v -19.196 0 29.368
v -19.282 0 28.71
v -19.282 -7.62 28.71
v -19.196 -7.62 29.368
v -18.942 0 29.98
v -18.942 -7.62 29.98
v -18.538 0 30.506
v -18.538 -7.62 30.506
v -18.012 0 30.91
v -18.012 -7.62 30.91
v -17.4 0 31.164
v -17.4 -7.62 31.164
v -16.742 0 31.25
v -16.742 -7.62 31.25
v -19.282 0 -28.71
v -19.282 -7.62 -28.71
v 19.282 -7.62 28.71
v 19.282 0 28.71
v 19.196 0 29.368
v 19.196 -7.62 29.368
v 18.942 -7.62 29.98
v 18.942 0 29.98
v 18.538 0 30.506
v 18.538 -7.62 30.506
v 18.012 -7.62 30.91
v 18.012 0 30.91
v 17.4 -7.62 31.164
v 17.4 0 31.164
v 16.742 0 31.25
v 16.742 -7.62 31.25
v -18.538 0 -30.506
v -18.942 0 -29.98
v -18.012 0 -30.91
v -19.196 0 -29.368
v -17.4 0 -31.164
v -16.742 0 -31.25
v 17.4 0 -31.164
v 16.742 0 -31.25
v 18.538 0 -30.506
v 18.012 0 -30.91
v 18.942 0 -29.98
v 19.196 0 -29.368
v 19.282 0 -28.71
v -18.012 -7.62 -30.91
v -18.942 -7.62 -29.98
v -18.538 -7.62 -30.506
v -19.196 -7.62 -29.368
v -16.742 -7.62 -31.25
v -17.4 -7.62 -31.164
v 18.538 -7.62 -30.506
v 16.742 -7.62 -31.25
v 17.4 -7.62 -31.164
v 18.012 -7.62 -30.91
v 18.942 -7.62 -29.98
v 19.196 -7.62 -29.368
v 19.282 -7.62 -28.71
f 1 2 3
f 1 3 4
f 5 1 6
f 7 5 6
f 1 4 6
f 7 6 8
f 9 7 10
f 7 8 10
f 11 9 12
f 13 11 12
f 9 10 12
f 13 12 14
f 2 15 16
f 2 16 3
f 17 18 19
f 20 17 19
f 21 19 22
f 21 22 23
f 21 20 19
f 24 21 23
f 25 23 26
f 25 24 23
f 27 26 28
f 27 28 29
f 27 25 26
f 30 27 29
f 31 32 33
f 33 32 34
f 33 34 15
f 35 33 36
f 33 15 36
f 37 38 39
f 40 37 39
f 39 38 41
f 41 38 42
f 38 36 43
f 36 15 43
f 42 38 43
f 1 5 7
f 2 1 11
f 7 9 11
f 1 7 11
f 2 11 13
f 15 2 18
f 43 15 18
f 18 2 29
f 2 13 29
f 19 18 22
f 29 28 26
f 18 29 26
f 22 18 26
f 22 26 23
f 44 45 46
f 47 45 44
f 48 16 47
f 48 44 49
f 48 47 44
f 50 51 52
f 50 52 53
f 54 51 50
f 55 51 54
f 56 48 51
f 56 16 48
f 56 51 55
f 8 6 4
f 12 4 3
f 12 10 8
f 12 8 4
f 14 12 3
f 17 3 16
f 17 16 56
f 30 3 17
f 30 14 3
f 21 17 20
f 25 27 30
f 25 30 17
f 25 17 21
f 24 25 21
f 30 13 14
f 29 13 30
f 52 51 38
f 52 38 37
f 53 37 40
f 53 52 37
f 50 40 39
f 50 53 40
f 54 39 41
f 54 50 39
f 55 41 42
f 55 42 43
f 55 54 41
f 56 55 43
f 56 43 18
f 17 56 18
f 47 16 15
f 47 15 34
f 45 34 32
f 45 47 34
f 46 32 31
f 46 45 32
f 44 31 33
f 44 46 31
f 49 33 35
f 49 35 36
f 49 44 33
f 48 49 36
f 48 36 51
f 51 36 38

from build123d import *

# Parameters (mm, degrees)
F0_W     = 38.56438
F0_H     = 62.500886
F1_DEPTH = 7.62
F2_R     = 2.54
F3_W     = 33.48438
F3_H     = 20.629584
F4_DEPTH = 1.27


with BuildPart() as f1:
    # F0 (on Front) → F1 (new body)
    with BuildSketch(Plane.XZ):
        Rectangle(F0_W, F0_H)
    extrude(amount=F1_DEPTH)

    # F2
    f2_edges = [f1.edges().sort_by_distance(p)[0] for p in [
        (19.28219, -3.81, 31.250443),
        (-19.28219, -3.81, 31.250443),
        (19.28219, -3.81, -31.250443),
        (-19.28219, -3.81, -31.250443),
    ]]
    fillet(f2_edges, radius=F2_R)

    # F3 (on face) → F4 (join)
    with BuildSketch(Plane.XZ.offset(7.62)):
        with Locations((0, 18.395651)):
            Rectangle(F3_W, F3_H)
        with BuildLine():
            ThreePointArc((-19.28219, -28.710443), (-18.538241, -30.506495), (-16.74219, -31.250443))
            Line((-16.74219, -31.250443), (16.74219, -31.250443))
            ThreePointArc((16.74219, -31.250443), (18.538241, -30.506495), (19.28219, -28.710443))
            Line((19.28219, -28.710443), (19.28219, 28.710443))
            ThreePointArc((19.28219, 28.710443), (18.538241, 30.506495), (16.74219, 31.250443))
            Line((16.74219, 31.250443), (-16.74219, 31.250443))
            ThreePointArc((-16.74219, 31.250443), (-18.538241, 30.506495), (-19.28219, 28.710443))
            Line((-19.28219, 28.710443), (-19.28219, -28.710443))
        make_face()
        with Locations((0, 18.395651)):
            Rectangle(F3_W, F3_H, mode=Mode.SUBTRACT)
    extrude(amount=-F4_DEPTH)


solid = f1.part
